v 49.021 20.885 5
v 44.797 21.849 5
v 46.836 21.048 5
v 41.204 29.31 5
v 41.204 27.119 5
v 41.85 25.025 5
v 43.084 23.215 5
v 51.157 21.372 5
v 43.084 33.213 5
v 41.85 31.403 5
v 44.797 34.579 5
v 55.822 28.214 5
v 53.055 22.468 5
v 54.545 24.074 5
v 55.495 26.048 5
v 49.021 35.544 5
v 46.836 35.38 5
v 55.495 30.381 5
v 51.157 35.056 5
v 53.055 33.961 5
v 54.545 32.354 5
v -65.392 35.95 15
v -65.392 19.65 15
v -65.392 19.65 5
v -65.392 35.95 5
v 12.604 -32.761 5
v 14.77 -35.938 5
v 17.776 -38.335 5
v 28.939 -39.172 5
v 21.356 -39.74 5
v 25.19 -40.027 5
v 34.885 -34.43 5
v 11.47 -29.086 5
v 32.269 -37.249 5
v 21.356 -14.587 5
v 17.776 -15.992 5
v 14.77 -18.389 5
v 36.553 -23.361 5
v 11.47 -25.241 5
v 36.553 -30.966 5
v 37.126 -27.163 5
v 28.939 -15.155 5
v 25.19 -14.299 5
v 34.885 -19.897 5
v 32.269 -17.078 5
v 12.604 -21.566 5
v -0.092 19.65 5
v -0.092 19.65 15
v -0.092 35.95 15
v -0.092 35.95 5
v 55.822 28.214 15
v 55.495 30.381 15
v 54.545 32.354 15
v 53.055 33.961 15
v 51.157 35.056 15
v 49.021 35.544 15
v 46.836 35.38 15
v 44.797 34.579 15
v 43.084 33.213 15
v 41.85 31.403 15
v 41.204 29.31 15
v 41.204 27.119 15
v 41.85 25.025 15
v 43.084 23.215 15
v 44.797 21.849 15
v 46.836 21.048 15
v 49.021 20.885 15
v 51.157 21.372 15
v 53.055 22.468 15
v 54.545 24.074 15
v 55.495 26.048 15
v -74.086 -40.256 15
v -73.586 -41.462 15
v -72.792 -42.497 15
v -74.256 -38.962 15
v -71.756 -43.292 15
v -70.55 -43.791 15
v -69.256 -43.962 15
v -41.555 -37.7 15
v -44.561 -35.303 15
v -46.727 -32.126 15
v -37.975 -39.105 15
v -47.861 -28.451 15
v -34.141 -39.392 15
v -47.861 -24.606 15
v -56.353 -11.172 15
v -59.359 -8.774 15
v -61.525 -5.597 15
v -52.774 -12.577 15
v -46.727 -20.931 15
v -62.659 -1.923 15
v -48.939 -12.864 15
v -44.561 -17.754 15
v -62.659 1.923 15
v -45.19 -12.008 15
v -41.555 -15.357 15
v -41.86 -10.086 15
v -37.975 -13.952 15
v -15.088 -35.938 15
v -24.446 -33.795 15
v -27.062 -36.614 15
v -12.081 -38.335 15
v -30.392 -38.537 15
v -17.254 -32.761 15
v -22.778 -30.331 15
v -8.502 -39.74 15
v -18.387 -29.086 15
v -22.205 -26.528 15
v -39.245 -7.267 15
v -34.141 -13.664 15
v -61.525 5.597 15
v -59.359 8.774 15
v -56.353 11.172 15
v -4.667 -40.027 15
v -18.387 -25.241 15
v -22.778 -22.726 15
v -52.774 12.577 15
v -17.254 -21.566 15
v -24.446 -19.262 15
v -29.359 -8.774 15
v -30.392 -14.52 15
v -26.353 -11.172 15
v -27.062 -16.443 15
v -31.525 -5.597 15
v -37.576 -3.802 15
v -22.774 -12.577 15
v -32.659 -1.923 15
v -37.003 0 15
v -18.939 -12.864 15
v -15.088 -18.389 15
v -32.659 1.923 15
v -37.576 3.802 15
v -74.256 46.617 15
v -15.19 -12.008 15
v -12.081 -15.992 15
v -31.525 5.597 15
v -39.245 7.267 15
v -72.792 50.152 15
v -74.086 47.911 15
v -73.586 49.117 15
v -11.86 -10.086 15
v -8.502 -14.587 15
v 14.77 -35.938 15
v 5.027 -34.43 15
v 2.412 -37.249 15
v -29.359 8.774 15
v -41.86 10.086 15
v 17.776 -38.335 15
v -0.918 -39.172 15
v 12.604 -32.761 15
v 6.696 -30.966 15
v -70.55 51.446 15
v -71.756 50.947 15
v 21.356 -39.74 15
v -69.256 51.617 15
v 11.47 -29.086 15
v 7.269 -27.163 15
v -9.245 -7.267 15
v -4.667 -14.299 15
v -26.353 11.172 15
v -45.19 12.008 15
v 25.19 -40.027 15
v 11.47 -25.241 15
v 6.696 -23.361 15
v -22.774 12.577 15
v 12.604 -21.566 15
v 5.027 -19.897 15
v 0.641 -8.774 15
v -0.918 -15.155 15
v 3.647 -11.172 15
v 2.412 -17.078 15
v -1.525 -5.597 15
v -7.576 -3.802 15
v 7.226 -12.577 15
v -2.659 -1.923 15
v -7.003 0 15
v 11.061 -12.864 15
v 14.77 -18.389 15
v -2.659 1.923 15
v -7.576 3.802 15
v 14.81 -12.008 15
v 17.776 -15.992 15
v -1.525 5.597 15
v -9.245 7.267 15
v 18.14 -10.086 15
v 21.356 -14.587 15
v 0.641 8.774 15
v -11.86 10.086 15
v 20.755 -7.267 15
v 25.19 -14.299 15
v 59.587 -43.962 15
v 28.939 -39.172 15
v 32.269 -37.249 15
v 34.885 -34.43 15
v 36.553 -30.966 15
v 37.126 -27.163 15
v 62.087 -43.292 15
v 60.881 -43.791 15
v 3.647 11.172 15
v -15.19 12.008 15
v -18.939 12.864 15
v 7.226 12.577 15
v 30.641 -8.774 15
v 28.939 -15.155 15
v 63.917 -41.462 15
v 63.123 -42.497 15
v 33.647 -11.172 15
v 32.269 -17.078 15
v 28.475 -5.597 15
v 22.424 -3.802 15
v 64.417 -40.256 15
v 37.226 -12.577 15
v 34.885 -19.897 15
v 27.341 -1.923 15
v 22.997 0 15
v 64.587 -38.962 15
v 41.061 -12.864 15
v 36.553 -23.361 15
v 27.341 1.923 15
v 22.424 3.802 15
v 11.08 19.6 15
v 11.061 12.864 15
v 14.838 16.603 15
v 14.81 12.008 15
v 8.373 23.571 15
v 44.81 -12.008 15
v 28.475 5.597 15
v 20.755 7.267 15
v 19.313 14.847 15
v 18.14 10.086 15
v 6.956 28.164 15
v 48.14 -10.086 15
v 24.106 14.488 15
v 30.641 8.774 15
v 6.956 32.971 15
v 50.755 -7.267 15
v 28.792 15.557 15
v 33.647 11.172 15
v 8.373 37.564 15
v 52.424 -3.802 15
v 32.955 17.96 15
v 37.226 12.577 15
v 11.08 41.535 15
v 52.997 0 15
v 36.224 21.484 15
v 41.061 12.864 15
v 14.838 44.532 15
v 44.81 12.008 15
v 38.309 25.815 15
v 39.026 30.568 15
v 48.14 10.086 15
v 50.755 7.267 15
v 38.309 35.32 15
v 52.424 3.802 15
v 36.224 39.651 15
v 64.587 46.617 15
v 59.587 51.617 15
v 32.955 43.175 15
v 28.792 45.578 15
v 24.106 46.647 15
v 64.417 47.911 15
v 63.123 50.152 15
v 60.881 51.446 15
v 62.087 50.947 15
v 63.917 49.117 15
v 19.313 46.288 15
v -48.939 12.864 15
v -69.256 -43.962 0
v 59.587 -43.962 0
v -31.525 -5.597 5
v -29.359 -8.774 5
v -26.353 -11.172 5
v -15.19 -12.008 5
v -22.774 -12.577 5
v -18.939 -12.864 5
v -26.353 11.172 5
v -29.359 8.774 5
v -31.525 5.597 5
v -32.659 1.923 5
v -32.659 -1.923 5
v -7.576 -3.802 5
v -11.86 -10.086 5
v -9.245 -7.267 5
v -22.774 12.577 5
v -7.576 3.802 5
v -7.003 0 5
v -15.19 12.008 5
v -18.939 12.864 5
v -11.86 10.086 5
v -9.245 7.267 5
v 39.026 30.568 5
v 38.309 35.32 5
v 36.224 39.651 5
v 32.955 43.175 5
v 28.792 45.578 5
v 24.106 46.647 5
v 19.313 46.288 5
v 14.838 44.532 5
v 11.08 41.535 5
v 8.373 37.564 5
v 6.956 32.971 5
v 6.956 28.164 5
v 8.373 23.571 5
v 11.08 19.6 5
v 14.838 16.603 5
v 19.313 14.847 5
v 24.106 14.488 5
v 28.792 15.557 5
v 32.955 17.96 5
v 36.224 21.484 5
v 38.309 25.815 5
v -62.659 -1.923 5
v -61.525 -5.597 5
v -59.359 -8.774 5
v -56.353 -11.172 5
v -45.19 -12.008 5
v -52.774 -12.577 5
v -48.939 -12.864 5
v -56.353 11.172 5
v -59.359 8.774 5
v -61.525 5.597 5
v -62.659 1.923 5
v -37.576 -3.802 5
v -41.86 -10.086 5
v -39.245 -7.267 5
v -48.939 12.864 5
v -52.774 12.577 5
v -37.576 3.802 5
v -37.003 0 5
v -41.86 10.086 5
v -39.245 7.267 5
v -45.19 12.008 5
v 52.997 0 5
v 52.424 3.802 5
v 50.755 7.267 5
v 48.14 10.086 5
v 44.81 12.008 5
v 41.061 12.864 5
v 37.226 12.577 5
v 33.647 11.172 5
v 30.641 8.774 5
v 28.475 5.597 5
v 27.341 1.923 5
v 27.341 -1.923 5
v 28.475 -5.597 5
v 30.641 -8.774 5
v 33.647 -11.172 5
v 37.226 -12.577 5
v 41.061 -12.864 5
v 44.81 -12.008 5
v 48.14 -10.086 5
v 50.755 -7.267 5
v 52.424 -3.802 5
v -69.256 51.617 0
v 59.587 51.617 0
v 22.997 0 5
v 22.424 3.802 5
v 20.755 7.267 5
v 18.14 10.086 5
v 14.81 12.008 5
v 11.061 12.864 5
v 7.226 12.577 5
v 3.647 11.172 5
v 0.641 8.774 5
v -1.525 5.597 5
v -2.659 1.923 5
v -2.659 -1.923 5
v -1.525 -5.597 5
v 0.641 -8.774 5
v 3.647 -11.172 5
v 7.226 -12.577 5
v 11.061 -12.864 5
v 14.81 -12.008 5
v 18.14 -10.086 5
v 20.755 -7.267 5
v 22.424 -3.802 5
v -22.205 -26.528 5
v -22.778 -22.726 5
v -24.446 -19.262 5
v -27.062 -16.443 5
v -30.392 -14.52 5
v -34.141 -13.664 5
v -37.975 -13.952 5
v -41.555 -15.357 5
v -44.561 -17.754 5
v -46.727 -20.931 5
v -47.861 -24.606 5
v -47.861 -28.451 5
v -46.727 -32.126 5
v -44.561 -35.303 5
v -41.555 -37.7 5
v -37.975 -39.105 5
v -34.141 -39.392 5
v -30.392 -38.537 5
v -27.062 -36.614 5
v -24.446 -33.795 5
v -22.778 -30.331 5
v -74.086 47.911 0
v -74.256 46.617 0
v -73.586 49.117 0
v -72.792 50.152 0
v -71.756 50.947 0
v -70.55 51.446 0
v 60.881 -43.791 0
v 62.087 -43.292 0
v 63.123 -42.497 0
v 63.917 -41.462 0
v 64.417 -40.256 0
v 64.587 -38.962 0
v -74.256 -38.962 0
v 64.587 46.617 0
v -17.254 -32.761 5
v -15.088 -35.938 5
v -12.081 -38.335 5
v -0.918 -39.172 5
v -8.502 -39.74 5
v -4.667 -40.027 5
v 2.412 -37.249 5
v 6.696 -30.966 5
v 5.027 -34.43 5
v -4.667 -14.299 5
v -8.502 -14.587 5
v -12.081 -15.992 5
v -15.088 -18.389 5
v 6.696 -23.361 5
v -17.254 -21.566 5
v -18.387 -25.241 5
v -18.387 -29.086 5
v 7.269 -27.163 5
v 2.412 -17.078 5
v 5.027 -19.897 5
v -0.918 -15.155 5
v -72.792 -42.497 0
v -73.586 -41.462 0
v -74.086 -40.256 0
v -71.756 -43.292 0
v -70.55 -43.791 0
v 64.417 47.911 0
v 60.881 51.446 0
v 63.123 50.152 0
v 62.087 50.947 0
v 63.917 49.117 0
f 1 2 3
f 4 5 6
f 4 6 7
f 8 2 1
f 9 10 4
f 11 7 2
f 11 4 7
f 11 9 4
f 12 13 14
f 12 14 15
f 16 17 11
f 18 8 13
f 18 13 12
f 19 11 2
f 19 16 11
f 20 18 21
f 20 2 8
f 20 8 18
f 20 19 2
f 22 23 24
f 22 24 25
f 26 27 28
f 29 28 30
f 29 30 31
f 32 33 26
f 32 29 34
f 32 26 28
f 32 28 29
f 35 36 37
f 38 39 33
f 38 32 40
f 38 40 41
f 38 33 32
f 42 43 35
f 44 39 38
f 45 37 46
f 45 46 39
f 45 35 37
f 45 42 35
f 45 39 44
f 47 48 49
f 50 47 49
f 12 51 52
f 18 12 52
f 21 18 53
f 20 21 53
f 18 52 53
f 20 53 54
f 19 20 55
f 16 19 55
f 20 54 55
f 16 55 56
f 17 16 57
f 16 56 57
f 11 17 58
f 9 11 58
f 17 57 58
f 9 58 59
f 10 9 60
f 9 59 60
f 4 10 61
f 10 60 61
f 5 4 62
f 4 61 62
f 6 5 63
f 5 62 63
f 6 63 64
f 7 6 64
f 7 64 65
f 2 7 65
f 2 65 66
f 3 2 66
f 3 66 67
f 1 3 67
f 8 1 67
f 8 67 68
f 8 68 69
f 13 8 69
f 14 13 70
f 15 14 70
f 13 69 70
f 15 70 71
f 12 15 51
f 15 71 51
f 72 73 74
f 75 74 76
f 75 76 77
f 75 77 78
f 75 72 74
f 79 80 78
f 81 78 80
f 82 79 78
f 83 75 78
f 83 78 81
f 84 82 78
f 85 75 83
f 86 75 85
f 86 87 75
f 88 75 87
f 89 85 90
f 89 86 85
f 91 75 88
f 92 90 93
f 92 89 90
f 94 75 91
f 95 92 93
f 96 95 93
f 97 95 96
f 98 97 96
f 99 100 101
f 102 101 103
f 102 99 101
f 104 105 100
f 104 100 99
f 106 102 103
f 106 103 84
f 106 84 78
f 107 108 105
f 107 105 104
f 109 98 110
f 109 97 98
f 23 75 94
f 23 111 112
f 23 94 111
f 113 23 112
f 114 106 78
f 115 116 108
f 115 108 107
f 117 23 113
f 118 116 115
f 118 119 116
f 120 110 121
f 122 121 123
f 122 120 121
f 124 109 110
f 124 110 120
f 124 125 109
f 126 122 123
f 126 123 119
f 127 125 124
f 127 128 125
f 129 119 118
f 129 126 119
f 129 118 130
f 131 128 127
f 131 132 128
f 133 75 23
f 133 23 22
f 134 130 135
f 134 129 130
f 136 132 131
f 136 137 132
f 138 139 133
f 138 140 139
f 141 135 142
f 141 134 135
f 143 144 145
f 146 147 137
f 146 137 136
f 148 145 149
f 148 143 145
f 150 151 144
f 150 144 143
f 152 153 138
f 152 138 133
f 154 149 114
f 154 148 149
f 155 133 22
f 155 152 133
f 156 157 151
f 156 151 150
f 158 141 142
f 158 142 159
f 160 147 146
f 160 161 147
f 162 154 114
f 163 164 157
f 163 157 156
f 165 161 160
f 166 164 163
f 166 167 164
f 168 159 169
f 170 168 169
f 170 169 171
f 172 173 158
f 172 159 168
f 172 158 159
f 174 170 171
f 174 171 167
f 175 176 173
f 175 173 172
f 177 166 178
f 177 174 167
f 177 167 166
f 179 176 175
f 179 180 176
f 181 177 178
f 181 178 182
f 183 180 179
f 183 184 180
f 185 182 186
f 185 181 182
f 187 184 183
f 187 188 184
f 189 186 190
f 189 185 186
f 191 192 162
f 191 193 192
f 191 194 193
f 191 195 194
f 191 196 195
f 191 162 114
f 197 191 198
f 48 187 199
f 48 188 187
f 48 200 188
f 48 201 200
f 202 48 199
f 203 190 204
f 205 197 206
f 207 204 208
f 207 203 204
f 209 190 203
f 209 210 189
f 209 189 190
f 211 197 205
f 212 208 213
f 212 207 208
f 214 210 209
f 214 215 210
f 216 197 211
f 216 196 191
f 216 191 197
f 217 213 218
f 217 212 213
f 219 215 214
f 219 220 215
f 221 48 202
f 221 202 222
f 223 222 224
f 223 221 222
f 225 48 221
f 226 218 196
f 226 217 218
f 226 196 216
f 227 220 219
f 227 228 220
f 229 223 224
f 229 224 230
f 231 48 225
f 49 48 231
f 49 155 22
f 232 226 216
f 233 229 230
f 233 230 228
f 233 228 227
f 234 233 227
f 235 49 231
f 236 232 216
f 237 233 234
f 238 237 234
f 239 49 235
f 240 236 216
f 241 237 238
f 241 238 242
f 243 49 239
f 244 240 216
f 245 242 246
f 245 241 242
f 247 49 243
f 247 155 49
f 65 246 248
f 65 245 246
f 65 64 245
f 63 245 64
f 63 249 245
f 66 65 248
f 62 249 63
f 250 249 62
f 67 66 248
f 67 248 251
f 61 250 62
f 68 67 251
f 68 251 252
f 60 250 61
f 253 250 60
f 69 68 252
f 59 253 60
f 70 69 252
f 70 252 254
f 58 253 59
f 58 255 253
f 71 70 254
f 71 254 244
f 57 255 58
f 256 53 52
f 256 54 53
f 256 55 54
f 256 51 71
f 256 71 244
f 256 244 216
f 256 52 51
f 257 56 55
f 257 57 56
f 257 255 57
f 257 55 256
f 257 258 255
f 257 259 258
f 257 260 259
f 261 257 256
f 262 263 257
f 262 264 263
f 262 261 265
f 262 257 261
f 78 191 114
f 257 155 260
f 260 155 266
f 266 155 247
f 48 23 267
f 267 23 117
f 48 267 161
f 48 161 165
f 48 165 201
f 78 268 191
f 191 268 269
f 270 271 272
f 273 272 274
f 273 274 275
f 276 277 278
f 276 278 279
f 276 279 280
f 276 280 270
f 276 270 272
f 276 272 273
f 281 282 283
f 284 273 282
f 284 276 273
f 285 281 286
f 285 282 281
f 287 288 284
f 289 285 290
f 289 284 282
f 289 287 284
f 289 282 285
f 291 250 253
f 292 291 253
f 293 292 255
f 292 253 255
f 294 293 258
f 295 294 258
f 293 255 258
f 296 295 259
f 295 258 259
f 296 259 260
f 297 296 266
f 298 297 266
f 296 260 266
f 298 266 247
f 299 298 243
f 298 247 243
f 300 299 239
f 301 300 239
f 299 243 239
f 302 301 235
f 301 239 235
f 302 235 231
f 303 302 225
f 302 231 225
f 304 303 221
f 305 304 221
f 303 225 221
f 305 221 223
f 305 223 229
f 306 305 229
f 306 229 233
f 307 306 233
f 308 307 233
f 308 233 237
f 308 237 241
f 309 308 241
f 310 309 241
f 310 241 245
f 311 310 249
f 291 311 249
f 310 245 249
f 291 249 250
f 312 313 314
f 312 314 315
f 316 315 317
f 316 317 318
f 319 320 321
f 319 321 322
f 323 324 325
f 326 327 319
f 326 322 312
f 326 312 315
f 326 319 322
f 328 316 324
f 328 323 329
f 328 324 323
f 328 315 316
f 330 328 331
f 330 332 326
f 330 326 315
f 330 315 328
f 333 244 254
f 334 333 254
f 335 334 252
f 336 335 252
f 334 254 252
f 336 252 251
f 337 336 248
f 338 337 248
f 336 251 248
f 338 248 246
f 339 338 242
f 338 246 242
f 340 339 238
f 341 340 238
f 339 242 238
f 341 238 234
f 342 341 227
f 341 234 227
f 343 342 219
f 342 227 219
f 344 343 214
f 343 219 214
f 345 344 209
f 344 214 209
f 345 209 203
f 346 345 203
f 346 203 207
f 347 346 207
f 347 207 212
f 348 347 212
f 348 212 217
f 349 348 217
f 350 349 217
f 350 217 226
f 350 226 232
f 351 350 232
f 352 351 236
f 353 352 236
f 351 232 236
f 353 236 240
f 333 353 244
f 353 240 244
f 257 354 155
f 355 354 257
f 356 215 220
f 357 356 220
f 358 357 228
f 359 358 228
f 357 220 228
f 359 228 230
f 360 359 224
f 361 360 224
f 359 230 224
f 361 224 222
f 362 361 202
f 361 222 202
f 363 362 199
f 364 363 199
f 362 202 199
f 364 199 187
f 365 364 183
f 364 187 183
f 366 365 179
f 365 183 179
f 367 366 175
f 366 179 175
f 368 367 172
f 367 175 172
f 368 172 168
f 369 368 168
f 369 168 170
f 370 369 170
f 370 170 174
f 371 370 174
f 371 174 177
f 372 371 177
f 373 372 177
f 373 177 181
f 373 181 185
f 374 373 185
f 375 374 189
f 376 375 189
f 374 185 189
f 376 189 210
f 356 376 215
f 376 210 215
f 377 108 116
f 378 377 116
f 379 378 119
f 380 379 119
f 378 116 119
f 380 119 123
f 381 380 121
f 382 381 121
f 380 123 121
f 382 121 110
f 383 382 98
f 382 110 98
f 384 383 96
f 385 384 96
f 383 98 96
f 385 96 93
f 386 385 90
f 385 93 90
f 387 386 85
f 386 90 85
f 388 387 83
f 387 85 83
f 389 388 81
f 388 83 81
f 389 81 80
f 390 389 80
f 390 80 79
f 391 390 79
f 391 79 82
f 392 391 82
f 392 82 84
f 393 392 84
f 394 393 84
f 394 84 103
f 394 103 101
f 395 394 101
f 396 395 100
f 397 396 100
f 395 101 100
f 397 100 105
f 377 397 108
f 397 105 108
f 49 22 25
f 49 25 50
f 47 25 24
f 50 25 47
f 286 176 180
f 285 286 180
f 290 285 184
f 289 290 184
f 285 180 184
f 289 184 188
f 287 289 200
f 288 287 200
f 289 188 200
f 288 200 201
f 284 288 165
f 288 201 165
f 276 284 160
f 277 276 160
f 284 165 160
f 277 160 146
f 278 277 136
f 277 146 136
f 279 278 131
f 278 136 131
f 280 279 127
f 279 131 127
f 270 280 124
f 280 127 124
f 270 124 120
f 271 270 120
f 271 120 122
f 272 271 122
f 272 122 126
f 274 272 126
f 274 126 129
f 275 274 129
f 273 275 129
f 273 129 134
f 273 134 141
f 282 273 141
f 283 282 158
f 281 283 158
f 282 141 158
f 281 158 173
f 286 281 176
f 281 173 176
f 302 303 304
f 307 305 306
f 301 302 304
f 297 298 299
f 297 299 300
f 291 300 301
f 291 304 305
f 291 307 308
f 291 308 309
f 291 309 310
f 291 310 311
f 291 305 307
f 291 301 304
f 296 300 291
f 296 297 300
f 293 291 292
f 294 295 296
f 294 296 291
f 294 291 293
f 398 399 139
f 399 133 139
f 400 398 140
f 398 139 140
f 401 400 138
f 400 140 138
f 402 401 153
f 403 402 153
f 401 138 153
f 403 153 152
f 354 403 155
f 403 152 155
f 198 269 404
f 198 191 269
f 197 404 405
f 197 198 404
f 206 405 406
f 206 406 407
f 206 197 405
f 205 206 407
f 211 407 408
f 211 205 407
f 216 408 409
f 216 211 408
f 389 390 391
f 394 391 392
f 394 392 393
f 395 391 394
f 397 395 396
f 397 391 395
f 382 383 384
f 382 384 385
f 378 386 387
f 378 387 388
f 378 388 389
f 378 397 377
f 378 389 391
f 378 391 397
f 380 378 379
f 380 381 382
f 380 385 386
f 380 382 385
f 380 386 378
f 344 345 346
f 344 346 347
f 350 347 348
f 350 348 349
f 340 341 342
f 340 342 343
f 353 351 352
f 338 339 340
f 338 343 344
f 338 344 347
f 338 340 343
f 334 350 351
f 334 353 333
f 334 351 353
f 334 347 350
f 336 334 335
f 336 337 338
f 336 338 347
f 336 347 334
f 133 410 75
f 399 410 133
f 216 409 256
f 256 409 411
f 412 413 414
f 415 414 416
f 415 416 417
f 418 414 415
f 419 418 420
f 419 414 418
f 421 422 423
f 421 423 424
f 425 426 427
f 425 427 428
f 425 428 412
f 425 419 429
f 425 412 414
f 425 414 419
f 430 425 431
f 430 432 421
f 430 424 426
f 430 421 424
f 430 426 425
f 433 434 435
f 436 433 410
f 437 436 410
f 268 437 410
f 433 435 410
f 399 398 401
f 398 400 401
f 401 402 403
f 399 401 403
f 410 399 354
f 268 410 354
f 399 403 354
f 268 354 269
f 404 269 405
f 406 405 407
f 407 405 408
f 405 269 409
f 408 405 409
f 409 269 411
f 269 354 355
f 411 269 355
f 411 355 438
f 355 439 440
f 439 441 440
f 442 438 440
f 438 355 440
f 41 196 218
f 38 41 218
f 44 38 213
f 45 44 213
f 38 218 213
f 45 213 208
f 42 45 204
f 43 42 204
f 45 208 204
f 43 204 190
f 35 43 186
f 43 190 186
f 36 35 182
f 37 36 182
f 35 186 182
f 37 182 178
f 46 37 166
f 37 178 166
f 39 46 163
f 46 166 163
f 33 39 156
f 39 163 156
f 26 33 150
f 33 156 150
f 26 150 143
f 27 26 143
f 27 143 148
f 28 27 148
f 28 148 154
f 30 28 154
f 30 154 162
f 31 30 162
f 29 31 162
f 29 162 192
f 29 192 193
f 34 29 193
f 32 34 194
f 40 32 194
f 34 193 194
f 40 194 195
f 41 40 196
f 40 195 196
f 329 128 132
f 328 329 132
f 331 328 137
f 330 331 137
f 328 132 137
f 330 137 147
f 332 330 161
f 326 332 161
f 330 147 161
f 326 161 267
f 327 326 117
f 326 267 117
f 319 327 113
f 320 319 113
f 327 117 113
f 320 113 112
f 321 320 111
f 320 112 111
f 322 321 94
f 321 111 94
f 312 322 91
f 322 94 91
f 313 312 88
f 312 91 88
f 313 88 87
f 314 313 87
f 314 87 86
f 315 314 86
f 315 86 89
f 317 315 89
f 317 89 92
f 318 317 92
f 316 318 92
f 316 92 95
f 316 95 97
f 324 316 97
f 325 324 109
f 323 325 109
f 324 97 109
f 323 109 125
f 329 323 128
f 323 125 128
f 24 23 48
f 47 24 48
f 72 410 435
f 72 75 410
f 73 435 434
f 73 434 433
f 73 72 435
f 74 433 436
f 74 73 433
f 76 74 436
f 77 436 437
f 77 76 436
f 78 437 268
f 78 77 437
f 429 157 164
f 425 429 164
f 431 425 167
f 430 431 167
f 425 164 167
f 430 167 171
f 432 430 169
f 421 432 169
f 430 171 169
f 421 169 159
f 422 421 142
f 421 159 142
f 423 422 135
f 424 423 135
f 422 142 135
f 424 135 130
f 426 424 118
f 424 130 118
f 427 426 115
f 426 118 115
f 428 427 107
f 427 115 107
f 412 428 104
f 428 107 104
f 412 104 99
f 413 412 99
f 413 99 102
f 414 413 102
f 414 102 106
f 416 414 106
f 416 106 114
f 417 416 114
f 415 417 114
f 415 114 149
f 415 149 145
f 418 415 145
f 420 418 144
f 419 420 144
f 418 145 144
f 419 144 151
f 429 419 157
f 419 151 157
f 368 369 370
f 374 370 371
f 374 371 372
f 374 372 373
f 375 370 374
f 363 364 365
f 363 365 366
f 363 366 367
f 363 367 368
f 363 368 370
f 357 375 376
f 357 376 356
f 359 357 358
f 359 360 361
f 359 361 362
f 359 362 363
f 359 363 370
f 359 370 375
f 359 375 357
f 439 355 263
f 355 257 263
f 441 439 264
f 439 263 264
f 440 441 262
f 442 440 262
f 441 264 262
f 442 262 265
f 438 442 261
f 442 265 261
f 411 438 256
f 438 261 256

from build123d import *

# Parameters (mm, degrees)
F1_W     = 138.843298
F1_H     = 95.578349
F2_DEPTH = 15
F3_R     = 12.9
F3_W     = 65.3
F3_H     = 16.3
F3_R_2   = 7.35
F3_R_3   = 16.125
F4_DEPTH = 10
F5_R     = 5


with BuildPart() as f2:
    # F1 (on Top) → F2 (new body)
    with BuildSketch(Plane.XY):
        with Locations((-4.834347, 3.827586)):
            Rectangle(F1_W, F1_H)
    extrude(amount=F2_DEPTH)

    # F3 (on face) → F4 (cut)
    with BuildSketch(Plane.XY.offset(15)):
        with Locations((10.097019, 0)):
            Circle(F3_R)
        with Locations((-32.741672, 27.800055)):
            Rectangle(F3_W, F3_H)
        with Locations((-19.902981, 0)):
            Circle(F3_R)
        with Locations((40.097019, 0)):
            Circle(F3_R)
        with Locations((-49.902981, 0)):
            Circle(F3_R)
        with Locations((48.471941, 28.214054)):
            Circle(F3_R_2)
        with Locations((-5.631315, -27.163423)):
            Circle(F3_R)
        with Locations((-35.1047, -26.528409)):
            Circle(F3_R)
        with Locations((22.900803, 30.567518)):
            Circle(F3_R_3)
        with Locations((24.226132, -27.163423)):
            Circle(F3_R)
    extrude(amount=-F4_DEPTH, mode=Mode.SUBTRACT)

    # F5
    f5_edges = [f2.edges().sort_by_distance(p)[0] for p in [
        (64.587302, -43.961589, 7.5),
        (-74.255996, -43.961589, 7.5),
        (64.587302, 51.61676, 7.5),
        (-74.255996, 51.61676, 7.5),
    ]]
    fillet(f5_edges, radius=F5_R)


solid = f2.part
